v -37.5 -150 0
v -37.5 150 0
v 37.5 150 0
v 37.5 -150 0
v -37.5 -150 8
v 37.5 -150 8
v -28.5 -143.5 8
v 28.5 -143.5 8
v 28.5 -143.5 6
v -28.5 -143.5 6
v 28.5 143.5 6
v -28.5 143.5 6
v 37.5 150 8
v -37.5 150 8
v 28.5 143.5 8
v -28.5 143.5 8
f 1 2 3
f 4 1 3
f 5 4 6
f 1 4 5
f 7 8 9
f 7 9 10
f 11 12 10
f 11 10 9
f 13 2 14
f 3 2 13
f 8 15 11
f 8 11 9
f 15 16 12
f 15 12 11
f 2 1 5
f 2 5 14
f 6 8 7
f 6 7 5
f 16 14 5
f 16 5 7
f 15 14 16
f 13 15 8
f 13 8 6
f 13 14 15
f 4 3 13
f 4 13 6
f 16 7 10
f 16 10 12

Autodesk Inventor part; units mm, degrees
ref_plane "YZ Plane" through (0, 0, 0) normal (1, 0, 0) x (0, 1, 0)
ref_plane "XZ Plane" through (0, 0, 0) normal (0, 1, 0) x (-1, 0, 0)
ref_plane "XY Plane" through (0, 0, 0) normal (0, 0, 1) x (1, 0, 0)
sketch "Sketch1" plane through (0, 0, 0) normal (0, 0, 1) x (1, 0, 0)
  line L0 (-37.5, 150) -> (37.5, 150)
  line L1 (37.5, 150) -> (37.5, -150)
  line L2 (37.5, -150) -> (-37.5, -150)
  line L3 (-37.5, -150) -> (-37.5, 150)
  point P0 (0, 0)
  dimension "d0" = 75
  dimension "d1" = 300
  dimension "d2" = 150
  dimension "d3" = 37.5
extrude "Extrusion1" add sketch "Sketch1" along normal blind 8
sketch "Sketch2" plane through (0, 0, 8) normal (0, 0, 1) x (1, 0, 0)
  line L0 (-28.5, 143.5) -> (28.5, 143.5)
  line L1 (28.5, 143.5) -> (28.5, -143.5)
  line L2 (28.5, -143.5) -> (-28.5, -143.5)
  line L3 (-28.5, -143.5) -> (-28.5, 143.5)
  point P0 (0, 0)
  dimension "d6" = 57
  dimension "d7" = 287
  dimension "d8" = 143.5
  dimension "d9" = 28.5
extrude "Extrusion2" cut sketch "Sketch2" against normal blind 2
equation "\"d2\" = 0.5 * d1"
equation "\"d3\" = 0.5 * d0"
equation "\"d8\" = 0.5 * d7"
equation "\"d9\" = 0.5 * d6"
properties part number "filter top plate" material "Aluminum 6061-AHC"
